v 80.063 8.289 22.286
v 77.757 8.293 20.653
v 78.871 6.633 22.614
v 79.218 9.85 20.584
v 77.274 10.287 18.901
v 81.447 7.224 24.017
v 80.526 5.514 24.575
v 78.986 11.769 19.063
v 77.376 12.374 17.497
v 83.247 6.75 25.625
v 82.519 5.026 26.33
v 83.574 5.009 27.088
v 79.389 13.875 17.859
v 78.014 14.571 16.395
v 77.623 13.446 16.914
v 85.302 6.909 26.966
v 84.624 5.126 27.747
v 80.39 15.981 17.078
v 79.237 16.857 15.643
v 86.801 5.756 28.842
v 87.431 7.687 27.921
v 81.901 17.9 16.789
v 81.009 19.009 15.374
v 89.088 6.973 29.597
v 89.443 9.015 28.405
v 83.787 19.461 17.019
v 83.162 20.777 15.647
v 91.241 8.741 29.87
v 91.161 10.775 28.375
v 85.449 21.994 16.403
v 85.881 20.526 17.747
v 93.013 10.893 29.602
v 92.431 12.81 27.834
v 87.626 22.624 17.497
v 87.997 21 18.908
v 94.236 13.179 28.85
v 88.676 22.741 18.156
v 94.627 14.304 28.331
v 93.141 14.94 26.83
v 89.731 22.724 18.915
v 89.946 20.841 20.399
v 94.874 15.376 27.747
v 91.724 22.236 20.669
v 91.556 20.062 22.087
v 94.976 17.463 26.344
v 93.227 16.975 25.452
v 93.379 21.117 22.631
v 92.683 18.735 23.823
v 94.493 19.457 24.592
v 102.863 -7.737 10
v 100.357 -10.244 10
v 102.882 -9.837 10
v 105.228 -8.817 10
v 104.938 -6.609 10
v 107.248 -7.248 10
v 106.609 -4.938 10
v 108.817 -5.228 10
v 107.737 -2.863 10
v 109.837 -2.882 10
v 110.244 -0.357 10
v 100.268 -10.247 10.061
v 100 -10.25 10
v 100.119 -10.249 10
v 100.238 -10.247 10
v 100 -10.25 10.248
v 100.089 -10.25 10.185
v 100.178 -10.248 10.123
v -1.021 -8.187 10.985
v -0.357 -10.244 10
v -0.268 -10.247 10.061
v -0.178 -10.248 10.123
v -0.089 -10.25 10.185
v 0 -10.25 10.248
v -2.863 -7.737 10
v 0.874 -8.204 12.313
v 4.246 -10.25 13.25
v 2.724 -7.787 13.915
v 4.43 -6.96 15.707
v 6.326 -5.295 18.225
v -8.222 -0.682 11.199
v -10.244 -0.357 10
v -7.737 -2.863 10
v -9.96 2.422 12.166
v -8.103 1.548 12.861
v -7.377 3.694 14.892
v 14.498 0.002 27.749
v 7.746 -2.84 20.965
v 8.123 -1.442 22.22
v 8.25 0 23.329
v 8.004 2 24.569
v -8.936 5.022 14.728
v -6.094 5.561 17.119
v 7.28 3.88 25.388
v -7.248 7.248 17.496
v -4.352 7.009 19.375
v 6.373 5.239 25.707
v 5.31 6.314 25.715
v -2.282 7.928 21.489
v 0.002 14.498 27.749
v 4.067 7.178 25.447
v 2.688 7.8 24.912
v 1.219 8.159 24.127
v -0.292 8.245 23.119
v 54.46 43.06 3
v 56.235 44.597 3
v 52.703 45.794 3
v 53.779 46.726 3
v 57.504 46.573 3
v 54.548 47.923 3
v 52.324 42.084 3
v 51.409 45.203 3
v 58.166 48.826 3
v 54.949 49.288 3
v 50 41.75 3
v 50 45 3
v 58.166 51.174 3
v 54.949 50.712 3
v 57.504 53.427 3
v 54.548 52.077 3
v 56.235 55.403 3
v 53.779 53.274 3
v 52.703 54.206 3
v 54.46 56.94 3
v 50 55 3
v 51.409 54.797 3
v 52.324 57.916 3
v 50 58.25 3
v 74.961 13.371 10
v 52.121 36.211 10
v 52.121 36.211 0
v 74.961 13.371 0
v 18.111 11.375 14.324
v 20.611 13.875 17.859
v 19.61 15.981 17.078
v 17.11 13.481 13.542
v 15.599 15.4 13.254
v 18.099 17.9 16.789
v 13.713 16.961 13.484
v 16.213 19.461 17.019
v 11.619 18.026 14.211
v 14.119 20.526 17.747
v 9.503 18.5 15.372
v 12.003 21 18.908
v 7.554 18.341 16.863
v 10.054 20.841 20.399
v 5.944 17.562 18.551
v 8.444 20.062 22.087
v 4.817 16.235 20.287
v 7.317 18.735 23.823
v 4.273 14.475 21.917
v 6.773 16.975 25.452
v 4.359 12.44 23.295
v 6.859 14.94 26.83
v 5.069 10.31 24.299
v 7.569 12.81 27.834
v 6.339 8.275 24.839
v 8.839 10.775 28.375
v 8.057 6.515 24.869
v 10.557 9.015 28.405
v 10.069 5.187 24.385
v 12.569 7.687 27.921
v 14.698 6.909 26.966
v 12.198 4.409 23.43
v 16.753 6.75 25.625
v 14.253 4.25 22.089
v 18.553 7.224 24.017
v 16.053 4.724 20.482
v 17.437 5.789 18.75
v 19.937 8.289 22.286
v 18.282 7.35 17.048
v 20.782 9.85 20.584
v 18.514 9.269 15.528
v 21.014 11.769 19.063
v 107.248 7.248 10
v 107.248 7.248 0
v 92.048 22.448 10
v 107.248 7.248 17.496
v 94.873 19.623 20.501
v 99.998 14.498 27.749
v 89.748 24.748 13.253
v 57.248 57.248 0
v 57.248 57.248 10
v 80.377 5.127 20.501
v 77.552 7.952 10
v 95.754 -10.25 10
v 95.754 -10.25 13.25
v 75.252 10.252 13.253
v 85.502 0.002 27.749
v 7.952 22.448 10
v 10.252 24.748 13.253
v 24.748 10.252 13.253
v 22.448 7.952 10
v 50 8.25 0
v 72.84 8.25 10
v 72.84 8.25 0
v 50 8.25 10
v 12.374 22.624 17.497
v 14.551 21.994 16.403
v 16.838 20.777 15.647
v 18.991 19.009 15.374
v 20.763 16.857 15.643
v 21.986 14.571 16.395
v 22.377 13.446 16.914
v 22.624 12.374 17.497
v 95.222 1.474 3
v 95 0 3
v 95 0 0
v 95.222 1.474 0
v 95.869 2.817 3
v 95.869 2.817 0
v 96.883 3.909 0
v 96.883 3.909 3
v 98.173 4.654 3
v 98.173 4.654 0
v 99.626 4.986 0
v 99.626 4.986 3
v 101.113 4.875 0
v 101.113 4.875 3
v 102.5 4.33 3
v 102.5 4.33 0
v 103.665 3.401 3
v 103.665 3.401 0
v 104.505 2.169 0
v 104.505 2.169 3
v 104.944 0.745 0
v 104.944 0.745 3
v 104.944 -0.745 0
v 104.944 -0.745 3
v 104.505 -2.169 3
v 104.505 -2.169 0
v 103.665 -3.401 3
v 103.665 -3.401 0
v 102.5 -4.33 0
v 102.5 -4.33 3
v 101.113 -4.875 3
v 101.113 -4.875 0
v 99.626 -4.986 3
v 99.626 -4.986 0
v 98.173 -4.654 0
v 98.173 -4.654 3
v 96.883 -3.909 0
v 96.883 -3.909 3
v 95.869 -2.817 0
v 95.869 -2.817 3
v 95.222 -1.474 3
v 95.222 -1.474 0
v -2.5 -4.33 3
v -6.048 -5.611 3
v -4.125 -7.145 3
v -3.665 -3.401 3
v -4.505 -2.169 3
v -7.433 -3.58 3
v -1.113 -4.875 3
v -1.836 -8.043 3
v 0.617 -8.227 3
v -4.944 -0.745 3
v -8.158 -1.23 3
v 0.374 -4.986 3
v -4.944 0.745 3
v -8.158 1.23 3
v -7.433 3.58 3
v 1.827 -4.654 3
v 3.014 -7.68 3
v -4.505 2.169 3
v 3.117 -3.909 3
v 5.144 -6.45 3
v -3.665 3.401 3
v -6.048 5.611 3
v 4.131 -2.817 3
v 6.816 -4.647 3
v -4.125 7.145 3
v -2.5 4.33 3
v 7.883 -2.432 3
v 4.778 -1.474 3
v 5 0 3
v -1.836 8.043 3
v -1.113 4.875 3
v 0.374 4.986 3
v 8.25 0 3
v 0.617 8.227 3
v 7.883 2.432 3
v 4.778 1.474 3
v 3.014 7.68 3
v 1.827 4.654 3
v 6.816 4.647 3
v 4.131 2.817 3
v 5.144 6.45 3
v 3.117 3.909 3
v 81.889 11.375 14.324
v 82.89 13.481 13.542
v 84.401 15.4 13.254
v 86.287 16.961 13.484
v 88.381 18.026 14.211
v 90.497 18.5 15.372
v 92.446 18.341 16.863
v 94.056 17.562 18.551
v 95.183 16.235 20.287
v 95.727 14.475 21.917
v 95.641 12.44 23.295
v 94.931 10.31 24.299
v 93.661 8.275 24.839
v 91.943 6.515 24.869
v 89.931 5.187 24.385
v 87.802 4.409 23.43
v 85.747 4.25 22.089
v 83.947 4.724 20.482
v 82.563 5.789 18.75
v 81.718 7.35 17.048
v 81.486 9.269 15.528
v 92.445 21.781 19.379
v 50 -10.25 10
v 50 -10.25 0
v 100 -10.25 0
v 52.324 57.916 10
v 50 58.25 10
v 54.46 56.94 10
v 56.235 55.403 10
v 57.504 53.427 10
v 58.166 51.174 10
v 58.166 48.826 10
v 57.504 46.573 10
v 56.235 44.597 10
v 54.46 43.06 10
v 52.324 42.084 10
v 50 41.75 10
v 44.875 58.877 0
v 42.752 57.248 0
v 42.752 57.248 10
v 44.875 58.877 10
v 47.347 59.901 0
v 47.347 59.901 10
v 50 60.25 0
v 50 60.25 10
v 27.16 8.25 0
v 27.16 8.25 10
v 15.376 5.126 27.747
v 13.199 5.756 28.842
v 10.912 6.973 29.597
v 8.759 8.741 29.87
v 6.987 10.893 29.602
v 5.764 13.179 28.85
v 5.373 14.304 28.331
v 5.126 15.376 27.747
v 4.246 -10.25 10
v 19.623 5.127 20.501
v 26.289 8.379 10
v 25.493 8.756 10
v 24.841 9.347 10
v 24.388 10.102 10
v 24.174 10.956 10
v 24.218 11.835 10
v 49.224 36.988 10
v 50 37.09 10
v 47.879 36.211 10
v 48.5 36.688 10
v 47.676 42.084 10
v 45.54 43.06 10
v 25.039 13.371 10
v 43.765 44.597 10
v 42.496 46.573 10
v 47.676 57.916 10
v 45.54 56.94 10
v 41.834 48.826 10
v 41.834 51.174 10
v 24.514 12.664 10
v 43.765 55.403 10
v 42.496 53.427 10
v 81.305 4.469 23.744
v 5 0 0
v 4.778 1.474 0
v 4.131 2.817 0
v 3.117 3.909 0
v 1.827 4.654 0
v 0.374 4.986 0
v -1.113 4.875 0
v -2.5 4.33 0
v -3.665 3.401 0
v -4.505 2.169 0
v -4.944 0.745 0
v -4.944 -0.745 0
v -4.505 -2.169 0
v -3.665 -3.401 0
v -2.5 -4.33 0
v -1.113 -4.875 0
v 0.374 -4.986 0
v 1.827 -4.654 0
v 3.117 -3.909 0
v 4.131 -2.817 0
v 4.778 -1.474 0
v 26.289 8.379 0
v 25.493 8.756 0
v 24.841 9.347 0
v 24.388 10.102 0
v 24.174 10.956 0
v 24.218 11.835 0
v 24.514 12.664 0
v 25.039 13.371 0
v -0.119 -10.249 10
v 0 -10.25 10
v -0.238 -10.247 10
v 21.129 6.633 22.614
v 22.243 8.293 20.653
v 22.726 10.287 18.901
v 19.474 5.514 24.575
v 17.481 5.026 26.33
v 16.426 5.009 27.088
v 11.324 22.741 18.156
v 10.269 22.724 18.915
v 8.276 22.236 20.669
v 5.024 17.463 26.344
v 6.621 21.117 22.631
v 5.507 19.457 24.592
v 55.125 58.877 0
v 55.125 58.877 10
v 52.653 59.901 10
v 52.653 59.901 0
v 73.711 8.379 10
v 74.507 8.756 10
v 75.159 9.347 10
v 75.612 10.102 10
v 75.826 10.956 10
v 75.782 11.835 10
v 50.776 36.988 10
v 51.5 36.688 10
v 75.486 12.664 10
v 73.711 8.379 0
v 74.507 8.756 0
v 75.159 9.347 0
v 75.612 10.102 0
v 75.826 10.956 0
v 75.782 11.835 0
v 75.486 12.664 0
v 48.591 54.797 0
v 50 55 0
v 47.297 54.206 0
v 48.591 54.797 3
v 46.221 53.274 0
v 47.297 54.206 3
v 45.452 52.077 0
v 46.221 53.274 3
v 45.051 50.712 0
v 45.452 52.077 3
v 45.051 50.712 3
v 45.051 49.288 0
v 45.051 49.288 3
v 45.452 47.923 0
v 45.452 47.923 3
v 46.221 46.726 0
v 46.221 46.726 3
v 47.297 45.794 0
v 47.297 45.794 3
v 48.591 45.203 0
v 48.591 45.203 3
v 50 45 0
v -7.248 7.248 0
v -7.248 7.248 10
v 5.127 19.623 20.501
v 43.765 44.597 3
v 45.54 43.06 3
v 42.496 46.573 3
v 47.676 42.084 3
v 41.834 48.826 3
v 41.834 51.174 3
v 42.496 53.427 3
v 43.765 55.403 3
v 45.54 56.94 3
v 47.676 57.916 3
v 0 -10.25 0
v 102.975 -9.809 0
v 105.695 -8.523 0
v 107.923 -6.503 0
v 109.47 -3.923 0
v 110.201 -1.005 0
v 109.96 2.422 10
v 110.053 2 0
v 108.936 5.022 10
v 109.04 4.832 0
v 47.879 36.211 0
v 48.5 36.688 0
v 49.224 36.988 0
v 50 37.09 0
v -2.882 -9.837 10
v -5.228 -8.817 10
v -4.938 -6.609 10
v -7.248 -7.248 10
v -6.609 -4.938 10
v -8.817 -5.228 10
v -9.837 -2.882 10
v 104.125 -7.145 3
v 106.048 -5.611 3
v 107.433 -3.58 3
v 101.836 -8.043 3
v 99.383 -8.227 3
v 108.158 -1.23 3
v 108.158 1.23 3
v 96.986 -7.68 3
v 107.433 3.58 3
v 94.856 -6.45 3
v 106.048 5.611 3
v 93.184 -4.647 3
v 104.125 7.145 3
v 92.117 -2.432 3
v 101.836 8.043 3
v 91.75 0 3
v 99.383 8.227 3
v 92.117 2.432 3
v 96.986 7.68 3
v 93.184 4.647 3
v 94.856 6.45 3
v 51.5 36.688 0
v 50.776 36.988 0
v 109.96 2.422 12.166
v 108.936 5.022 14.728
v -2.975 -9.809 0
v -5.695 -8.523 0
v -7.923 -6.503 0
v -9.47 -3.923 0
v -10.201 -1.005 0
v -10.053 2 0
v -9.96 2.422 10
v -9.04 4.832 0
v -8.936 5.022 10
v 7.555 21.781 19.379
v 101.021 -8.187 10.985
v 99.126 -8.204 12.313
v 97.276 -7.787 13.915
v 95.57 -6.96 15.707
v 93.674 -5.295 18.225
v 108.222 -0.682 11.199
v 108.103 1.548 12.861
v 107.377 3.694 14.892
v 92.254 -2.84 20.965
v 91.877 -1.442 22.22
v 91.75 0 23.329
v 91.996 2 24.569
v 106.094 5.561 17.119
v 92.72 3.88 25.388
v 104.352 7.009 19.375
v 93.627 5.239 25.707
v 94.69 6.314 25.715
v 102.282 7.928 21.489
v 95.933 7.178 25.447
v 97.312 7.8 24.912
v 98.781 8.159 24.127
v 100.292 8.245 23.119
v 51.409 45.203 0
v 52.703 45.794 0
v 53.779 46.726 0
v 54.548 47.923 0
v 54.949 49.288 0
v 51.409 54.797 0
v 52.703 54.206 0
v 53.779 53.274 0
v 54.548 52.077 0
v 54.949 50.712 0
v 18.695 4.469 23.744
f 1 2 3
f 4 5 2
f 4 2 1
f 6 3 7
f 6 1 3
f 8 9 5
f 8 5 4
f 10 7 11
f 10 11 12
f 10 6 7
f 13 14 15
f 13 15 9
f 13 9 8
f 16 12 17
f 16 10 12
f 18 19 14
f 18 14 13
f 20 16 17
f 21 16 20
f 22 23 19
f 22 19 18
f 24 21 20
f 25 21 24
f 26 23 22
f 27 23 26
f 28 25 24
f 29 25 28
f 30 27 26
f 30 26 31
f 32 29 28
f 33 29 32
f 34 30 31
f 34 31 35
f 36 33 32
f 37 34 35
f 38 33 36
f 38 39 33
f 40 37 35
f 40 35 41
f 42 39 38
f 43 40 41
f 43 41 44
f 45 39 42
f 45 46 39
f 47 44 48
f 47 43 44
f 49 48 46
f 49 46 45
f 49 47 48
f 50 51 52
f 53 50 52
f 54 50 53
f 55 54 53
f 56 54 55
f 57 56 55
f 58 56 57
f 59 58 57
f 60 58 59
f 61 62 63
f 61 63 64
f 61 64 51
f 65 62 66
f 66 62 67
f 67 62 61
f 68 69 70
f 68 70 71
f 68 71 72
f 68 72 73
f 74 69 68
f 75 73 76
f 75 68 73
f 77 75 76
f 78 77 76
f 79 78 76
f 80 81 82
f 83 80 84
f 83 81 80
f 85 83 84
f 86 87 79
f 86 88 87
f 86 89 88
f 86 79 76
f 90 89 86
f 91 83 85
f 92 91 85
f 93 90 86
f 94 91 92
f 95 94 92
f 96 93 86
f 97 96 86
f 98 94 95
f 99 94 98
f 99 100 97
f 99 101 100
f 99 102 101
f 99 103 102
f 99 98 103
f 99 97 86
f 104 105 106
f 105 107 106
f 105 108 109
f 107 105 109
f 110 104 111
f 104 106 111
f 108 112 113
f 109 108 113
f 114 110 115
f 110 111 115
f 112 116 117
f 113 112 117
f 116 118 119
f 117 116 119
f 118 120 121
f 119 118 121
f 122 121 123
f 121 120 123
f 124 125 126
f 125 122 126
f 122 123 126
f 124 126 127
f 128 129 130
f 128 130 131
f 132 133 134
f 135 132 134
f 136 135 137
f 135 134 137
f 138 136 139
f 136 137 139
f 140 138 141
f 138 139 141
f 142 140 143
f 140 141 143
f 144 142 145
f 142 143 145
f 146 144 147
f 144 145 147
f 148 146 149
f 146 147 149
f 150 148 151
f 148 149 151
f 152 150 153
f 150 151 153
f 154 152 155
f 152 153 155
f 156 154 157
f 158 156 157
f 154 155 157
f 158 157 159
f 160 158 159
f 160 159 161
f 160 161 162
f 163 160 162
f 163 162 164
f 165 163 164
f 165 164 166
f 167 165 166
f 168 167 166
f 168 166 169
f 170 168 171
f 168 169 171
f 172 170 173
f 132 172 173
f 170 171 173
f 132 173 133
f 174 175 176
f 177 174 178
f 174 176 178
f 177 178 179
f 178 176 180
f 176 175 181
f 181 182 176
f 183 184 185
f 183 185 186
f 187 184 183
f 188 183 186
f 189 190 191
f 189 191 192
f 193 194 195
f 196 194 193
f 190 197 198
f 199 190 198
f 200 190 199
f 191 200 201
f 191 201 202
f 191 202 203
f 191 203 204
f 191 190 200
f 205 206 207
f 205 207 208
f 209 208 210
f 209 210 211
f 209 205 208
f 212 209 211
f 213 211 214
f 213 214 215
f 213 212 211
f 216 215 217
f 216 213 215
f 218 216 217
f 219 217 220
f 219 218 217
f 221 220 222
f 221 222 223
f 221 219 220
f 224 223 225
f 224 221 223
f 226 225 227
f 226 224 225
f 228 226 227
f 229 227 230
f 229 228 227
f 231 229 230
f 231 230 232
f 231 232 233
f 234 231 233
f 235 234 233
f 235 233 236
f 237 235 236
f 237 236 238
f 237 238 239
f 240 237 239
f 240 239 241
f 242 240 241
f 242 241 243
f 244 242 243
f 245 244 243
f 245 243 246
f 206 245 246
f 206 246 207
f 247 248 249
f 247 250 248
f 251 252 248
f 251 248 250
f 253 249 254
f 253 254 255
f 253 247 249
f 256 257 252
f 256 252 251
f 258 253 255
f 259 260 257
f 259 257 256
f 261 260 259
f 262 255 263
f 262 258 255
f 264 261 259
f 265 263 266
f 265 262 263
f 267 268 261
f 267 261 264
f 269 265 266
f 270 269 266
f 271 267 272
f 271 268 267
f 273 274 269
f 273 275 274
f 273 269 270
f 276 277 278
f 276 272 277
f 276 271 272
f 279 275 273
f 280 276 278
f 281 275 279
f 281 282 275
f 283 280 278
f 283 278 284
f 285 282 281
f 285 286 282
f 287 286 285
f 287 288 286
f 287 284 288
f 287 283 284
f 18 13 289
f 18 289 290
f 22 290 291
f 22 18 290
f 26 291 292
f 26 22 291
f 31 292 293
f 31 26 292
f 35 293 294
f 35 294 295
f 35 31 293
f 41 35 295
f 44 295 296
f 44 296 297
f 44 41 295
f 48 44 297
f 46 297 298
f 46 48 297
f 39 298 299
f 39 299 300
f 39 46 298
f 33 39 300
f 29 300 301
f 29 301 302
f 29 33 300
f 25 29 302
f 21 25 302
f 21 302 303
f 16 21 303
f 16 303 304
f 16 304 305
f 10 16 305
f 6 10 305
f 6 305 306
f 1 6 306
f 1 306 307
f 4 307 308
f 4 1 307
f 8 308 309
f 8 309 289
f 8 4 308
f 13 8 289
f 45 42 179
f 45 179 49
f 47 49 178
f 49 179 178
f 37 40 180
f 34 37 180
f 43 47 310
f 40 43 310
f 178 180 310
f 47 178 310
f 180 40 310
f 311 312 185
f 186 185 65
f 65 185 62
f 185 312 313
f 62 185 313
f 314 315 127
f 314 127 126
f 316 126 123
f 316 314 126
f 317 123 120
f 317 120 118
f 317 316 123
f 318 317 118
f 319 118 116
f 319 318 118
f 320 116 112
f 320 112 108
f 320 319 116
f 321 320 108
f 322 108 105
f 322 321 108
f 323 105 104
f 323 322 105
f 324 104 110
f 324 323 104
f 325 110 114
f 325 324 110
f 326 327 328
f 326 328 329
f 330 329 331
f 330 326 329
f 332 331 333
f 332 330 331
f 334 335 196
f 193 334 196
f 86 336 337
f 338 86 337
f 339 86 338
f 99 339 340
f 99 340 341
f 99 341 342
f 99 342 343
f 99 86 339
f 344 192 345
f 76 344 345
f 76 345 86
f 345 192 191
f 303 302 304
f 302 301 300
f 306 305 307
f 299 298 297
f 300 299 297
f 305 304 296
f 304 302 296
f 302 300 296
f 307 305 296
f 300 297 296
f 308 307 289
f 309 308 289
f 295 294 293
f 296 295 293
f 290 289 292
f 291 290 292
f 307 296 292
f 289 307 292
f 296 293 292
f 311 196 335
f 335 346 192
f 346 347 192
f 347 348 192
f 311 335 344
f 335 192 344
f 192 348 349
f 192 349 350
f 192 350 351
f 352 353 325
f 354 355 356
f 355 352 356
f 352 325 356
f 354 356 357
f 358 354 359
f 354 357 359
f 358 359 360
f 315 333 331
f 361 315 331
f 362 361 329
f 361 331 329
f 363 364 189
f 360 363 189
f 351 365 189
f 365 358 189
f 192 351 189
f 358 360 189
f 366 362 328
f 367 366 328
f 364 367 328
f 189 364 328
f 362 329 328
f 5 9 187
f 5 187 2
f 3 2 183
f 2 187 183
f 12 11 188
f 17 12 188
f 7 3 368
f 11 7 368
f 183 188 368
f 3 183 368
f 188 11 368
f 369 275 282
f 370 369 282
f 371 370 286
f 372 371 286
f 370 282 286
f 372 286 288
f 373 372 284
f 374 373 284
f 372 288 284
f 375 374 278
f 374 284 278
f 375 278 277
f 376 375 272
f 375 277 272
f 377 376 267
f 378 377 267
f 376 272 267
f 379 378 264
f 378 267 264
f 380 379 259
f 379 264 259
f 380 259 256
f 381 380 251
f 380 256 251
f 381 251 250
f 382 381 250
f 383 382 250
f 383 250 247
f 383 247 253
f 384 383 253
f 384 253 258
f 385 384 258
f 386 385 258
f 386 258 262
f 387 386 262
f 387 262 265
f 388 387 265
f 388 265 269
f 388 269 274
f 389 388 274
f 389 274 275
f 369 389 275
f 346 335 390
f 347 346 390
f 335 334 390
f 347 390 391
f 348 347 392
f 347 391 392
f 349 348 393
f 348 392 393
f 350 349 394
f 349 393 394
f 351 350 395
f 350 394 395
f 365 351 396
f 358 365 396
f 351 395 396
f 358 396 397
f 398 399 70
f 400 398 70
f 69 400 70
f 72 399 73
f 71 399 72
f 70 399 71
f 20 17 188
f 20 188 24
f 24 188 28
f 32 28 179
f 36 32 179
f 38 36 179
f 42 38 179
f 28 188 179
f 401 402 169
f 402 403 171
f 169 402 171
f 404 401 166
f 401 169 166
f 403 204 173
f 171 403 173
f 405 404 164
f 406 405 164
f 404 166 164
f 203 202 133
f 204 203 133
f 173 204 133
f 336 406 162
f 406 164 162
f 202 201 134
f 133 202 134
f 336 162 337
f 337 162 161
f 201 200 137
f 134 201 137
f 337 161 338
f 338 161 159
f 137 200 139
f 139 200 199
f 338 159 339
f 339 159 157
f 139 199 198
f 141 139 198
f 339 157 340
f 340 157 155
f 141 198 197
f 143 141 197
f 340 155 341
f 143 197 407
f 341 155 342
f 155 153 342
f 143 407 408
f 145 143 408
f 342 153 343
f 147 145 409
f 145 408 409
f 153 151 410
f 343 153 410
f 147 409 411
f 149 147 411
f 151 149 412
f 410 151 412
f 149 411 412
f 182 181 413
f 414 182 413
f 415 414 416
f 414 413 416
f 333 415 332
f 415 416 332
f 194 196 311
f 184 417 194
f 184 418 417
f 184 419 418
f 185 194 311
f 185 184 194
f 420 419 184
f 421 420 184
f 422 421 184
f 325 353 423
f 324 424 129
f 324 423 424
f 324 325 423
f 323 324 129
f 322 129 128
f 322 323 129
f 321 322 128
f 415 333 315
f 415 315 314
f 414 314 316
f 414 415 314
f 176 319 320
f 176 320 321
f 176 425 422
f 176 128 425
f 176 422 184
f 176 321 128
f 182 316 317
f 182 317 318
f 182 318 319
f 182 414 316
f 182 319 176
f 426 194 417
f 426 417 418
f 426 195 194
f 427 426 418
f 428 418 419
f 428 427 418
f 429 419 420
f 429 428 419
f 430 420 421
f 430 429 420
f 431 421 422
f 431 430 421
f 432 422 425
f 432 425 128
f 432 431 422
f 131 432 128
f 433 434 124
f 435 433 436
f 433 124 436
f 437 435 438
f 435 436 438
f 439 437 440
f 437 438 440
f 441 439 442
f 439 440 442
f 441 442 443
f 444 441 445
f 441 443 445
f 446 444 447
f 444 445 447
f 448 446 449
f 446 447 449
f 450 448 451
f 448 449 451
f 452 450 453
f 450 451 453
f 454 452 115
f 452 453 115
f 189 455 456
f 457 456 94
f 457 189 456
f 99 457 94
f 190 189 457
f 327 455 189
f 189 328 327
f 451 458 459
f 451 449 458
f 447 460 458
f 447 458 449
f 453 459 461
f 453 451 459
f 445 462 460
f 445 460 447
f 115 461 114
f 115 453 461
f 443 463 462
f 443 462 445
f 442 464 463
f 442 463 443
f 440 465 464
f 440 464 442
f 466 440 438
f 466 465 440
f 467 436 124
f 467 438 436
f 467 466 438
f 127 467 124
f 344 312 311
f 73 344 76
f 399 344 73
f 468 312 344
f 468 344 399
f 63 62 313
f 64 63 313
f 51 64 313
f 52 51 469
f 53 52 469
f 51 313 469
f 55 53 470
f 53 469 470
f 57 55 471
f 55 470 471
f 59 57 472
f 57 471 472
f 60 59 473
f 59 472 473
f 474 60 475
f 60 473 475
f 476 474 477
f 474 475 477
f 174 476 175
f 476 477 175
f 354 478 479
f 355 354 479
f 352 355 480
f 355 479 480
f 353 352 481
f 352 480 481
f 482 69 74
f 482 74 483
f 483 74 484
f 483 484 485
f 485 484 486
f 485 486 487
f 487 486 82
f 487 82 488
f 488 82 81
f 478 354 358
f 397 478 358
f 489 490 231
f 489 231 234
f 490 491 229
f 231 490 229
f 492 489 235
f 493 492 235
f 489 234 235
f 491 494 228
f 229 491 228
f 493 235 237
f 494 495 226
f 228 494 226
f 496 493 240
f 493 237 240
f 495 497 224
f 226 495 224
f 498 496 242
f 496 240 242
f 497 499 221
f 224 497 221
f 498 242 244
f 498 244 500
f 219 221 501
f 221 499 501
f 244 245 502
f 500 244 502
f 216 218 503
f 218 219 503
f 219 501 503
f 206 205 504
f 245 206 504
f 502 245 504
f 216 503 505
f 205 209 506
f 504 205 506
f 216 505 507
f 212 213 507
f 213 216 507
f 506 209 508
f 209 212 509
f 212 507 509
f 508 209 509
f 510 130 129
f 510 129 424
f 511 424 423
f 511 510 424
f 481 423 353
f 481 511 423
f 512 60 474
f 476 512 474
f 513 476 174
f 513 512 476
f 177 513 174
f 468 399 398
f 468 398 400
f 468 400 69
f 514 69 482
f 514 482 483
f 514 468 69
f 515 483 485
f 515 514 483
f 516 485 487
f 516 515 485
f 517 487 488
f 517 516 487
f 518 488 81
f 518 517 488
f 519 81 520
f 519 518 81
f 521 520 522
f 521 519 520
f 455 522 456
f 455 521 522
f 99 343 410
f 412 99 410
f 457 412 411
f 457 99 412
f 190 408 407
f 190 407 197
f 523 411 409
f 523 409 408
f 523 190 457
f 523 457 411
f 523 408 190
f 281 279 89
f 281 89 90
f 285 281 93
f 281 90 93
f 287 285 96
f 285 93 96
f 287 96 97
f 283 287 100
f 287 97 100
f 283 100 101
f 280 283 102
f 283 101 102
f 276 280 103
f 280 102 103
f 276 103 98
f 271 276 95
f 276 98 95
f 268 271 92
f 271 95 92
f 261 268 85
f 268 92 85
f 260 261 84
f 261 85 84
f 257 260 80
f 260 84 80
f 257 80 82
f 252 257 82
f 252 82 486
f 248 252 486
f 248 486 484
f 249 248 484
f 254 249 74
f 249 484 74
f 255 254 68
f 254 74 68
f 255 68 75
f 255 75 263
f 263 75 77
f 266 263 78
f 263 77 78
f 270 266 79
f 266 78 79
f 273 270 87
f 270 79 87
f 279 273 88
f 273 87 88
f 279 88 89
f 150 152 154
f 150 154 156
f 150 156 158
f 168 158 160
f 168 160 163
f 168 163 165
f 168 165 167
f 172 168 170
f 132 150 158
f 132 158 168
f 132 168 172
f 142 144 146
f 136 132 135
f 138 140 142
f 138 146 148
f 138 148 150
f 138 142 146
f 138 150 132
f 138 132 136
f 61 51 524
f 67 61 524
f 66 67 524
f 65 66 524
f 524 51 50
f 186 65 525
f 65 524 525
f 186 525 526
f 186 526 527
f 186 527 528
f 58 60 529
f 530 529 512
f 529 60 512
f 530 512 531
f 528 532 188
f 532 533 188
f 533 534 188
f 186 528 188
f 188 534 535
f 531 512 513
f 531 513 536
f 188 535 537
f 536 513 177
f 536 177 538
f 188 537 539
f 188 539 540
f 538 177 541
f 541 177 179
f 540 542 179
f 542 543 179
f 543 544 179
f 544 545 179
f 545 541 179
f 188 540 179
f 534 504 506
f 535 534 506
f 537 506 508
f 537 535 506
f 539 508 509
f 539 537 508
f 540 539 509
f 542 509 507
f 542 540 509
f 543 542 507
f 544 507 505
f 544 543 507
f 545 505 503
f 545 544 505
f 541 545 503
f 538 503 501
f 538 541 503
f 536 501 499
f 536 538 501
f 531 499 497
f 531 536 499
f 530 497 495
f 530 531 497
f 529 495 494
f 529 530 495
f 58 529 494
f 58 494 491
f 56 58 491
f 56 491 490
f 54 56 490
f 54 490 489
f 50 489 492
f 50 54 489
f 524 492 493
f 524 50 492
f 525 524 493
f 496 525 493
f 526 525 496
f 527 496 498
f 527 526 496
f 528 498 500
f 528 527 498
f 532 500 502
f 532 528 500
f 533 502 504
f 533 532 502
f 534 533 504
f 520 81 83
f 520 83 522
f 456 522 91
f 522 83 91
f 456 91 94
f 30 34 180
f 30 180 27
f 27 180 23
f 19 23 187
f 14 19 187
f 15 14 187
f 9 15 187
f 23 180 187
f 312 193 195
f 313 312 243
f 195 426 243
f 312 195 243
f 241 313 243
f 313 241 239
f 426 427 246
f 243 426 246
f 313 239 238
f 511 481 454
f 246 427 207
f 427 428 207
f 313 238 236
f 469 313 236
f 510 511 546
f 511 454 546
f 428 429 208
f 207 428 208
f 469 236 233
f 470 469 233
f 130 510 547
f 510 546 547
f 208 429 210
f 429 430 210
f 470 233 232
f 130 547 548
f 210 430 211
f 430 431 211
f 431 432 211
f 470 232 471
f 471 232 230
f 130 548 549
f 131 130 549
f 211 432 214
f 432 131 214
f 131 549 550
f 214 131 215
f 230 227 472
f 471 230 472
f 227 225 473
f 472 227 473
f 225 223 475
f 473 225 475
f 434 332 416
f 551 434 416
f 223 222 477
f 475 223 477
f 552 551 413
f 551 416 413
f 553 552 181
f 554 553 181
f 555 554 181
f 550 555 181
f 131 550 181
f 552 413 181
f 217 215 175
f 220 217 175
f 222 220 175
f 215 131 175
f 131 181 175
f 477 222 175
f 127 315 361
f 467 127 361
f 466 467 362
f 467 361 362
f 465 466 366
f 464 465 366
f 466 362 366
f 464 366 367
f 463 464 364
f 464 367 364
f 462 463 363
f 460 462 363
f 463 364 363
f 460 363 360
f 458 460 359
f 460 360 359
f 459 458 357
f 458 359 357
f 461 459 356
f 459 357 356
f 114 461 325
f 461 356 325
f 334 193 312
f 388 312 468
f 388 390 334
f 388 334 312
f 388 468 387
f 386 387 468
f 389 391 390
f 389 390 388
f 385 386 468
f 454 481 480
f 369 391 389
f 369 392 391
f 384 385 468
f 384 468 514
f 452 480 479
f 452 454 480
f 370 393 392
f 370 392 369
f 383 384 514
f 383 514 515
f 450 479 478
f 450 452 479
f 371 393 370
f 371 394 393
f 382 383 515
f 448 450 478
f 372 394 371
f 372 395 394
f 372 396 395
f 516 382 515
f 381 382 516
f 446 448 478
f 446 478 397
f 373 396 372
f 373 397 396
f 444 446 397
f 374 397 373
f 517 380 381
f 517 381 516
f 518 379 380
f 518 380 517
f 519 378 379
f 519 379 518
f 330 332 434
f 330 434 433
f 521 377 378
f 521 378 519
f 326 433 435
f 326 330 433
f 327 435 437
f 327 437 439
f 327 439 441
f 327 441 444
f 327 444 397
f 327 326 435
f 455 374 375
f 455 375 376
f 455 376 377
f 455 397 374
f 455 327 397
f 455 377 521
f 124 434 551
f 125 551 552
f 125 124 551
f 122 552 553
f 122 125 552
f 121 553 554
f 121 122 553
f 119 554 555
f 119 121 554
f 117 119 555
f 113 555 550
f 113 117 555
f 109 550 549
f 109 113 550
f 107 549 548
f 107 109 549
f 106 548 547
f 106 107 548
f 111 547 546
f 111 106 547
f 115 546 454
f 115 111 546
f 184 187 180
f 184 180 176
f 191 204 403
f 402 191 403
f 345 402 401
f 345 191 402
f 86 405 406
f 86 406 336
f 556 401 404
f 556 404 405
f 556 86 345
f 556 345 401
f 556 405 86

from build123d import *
from build123d.topology import SkipClean

# Parameters (mm, degrees)
BOSS_EXTRUDE1_DEPTH = 10
SKETCH2_R           = 8.25
CUT_EXTRUDE1_DEPTH  = 7
CUT_EXTRUDE2_DEPTH  = 16
FILLET2_R           = 3
SKETCH5_R           = 5
CUT_EXTRUDE3_DEPTH  = 16
BOSS_EXTRUDE2_DEPTH = 20.5
CUT_EXTRUDE4_START  = 20
SKETCH7_R           = 8.25
SKETCH7_R_2         = 5
CUT_EXTRUDE4_DEPTH  = 20
SKETCH9_R           = 8.25
CUT_EXTRUDE5_DEPTH  = 5
SKETCH10_W          = 60.25
SKETCH10_H          = 70.5
CUT_EXTRUDE6_DEPTH  = 45


with BuildPart() as part:
    # Sketch1 → Boss-Extrude1 (new body)
    with BuildSketch(Plane.XY):
        with BuildLine():
            Line((0, 10.25), (100, 10.25))
            ThreePointArc((100, 10.25), (110.25, 0), (100, -10.25))
            Line((100, -10.25), (0, -10.25))
            ThreePointArc((0, -10.25), (-10.25, 0), (0, 10.25))
        make_face()
        with BuildLine():
            Line((92.752155493, -7.247844507), (42.752155493, 42.752155493))
            ThreePointArc((42.752155493, 42.752155493), (42.752155493, 57.247844507), (57.247844507, 57.247844507))
            Line((57.247844507, 57.247844507), (107.247844507, 7.247844507))
            ThreePointArc((107.247844507, 7.247844507), (107.247844507, -7.247844507), (92.752155493, -7.247844507))
        make_face()
        with BuildLine():
            Line((57.247844507, 42.752155493), (7.247844507, -7.247844507))
            ThreePointArc((7.247844507, -7.247844507), (-7.247844507, -7.247844507), (-7.247844507, 7.247844507))
            Line((-7.247844507, 7.247844507), (42.752155493, 57.247844507))
            ThreePointArc((42.752155493, 57.247844507), (57.247844507, 57.247844507), (57.247844507, 42.752155493))
        make_face()
    extrude(amount=BOSS_EXTRUDE1_DEPTH)

    # Sketch2 → Cut-Extrude1 (cut)
    with BuildSketch(Plane.XY.offset(10)):
        with Locations((50, 50)):
            Circle(SKETCH2_R)
        with Locations((100, 0)):
            Circle(SKETCH2_R)
        Circle(SKETCH2_R)
    extrude(amount=-CUT_EXTRUDE1_DEPTH, mode=Mode.SUBTRACT)

    # Sketch4 → Cut-Extrude2 (cut)
    with BuildSketch(Plane.XY.offset(10)):
        Polygon((19.91726189, 8.25), (80.08273811, 8.25), (50, 38.33273811), align=None)
    extrude(amount=-CUT_EXTRUDE2_DEPTH, mode=Mode.SUBTRACT)

    # Fillet2
    fillet2_edges = [part.edges().sort_by_distance(p)[0] for p in [
        (19.91726189, 8.25, 5),
        (50, 38.33273811, 5),
        (80.08273811, 8.25, 5),
    ]]
    fillet(fillet2_edges, radius=FILLET2_R)

    # Sketch5 → Cut-Extrude3 (cut)
    with BuildSketch(Plane.XY.offset(10)):
        Circle(SKETCH5_R)
        with Locations((50, 50)):
            Circle(SKETCH5_R)
        with Locations((100, 0)):
            Circle(SKETCH5_R)
    extrude(amount=-CUT_EXTRUDE3_DEPTH, mode=Mode.SUBTRACT)

    # Sketch6 → Boss-Extrude2 (add)
    with BuildSketch(Plane(origin=(-7.247844507, 7.247844507, 0), x_dir=(0, 0, 1), z_dir=(-0.7071067811865441, 0.7071067811865509, 0))):
        Polygon((10, 21.495689014), (10, 7), (20.500892834, 17.500892834), (13.253048327, 24.748737342), align=None)
        Polygon((20.500892834, 17.500892834), (10, 7), (10, 0), (10, -7.495689014), (27.748737342, 10.253048327), align=None)
    extrude(amount=-BOSS_EXTRUDE2_DEPTH)

    # Sketch7 → Cut-Extrude4 (cut)
    # profile 1 of 3: a face of its own
    with BuildSketch(Plane.XY.offset(10).offset(CUT_EXTRUDE4_START)):
        with BuildLine():
            Line((20, -20.25), (20, -10.25))
            Line((20, -10.25), (4.245689014, -10.25))
            Line((4.245689014, -10.25), (0, -10.25))
            ThreePointArc((0, -10.25), (-9.469765208, -3.922505182), (-7.247844507, 7.247844507))
            Line((-7.247844507, 7.247844507), (7.951902961, 22.447591975))
            Line((7.951902961, 22.447591975), (15.254310986, 29.75))
            Line((15.254310986, 29.75), (-20, 29.75))
            Line((-20, 29.75), (-20, -20.25))
            Line((-20, -20.25), (20, -20.25))
        make_face()
    # profile 2 of 3: a face of its own
    with BuildSketch(Plane.XY.offset(10).offset(CUT_EXTRUDE4_START)):
        Circle(SKETCH7_R)
        Circle(SKETCH7_R_2, mode=Mode.SUBTRACT)
    # profile 3 of 3: a face of its own
    with BuildSketch(Plane.XY.offset(10).offset(CUT_EXTRUDE4_START)):
        Circle(SKETCH7_R_2)
    extrude(amount=-CUT_EXTRUDE4_DEPTH, mode=Mode.SUBTRACT)

    # Loft1: read off the stored shape, not the designer's step
    # Loft1: loft between two sections, ruled curve by curve
    loft1_from = [
        Edge.make_bspline([(12.373922254, 22.623922254, 17.497213178), (12.889457441, 22.535470399, 17.195219657), (13.432134989, 22.397880865, 16.908779176), (14.549790596, 22.011562197, 16.391645867), (15.124688663, 21.762676267, 16.161120474), (16.274806274, 21.151537295, 15.780005023), (16.849824782, 20.789221108, 15.629601769), (17.962375724, 19.963587433, 15.426720624), (18.499640751, 19.500359249, 15.374368671), (19.500359249, 18.499640751, 15.374368671), (19.963587433, 17.962375724, 15.426720624), (20.789221108, 16.849824782, 15.629601769), (21.151537295, 16.274806274, 15.780005023), (21.762676267, 15.124688663, 16.161120474), (22.011562197, 14.549790596, 16.391645867), (22.397880865, 13.432134989, 16.908779176), (22.535470399, 12.889457441, 17.195219657), (22.623922254, 12.373922254, 17.497213178)], [0, 0, 0, 0, 0.125, 0.125, 0.25, 0.25, 0.375, 0.375, 0.5, 0.5, 0.625, 0.625, 0.75, 0.75, 0.875, 0.875, 1, 1, 1, 1], 3),
        Edge.make_bspline([(22.623922254, 12.373922254, 17.497213178), (22.712374108, 11.858387066, 17.799206699), (22.758303856, 11.331435851, 18.13934024), (22.743701961, 10.282567338, 18.891327377), (22.682975729, 9.76079032, 19.303219376), (22.441392942, 8.756976633, 20.183847667), (22.260398337, 8.27517552, 20.652515015), (21.778027739, 7.387042631, 21.621607323), (21.476651925, 6.980962911, 22.121853929), (20.769037089, 6.273348075, 23.122572427), (20.362957369, 5.971972261, 23.622819032), (19.47482448, 5.489601663, 24.591911341), (18.993023367, 5.308607058, 25.060578689), (17.98920968, 5.067024271, 25.94120698), (17.467432662, 5.006298039, 26.353098979), (16.418564149, 4.991696144, 27.105086116), (15.891612934, 5.037625892, 27.445219657), (15.376077746, 5.126077746, 27.747213178)], [0, 0, 0, 0, 0.125, 0.125, 0.25, 0.25, 0.375, 0.375, 0.5, 0.5, 0.625, 0.625, 0.75, 0.75, 0.875, 0.875, 1, 1, 1, 1], 3),
        Edge.make_bspline([(5.126077746, 15.376077746, 27.747213178), (5.037625892, 15.891612934, 27.445219657), (4.991696144, 16.418564149, 27.105086116), (5.006298039, 17.467432662, 26.353098979), (5.067024271, 17.98920968, 25.94120698), (5.308607058, 18.993023367, 25.060578689), (5.489601663, 19.47482448, 24.591911341), (5.971972261, 20.362957369, 23.622819032), (6.273348075, 20.769037089, 23.122572427), (6.980962911, 21.476651925, 22.121853929), (7.387042631, 21.778027739, 21.621607323), (8.27517552, 22.260398337, 20.652515015), (8.756976633, 22.441392942, 20.183847667), (9.76079032, 22.682975729, 19.303219376), (10.282567338, 22.743701961, 18.891327377), (11.331435851, 22.758303856, 18.13934024), (11.858387066, 22.712374108, 17.799206699), (12.373922254, 22.623922254, 17.497213178)], [0, 0, 0, 0, 0.125, 0.125, 0.25, 0.25, 0.375, 0.375, 0.5, 0.5, 0.625, 0.625, 0.75, 0.75, 0.875, 0.875, 1, 1, 1, 1], 3),
        Edge.make_bspline([(15.376077746, 5.126077746, 27.747213178), (14.860542559, 5.214529601, 28.049206699), (14.317865011, 5.352119135, 28.33564718), (13.200209404, 5.738437803, 28.852780489), (12.625311337, 5.987323733, 29.083305882), (11.475193726, 6.598462705, 29.464421332), (10.900175218, 6.960778892, 29.614824586), (9.787624276, 7.786412567, 29.817705732), (9.250359249, 8.249640751, 29.870057685), (8.249640751, 9.250359249, 29.870057685), (7.786412567, 9.787624276, 29.817705732), (6.960778892, 10.900175218, 29.614824586), (6.598462705, 11.475193726, 29.464421332), (5.987323733, 12.625311337, 29.083305882), (5.738437803, 13.200209404, 28.852780489), (5.352119135, 14.317865011, 28.33564718), (5.214529601, 14.860542559, 28.049206699), (5.126077746, 15.376077746, 27.747213178)], [0, 0, 0, 0, 0.125, 0.125, 0.25, 0.25, 0.375, 0.375, 0.5, 0.5, 0.625, 0.625, 0.75, 0.75, 0.875, 0.875, 1, 1, 1, 1], 3),
    ]
    loft1_to = [
        Edge.make_bspline([(10.252155493, 24.747844507, 13.253048327), (10.856142535, 24.143857465, 13.253048327), (11.460129577, 23.539870423, 13.253048327), (12.668103662, 22.331896338, 13.253048327), (13.272090704, 21.727909296, 13.253048327), (14.480064789, 20.519935211, 13.253048327), (15.084051831, 19.915948169, 13.253048327), (16.292025915, 18.707974085, 13.253048327), (16.896012958, 18.103987042, 13.253048327), (18.103987042, 16.896012958, 13.253048327), (18.707974085, 16.292025915, 13.253048327), (19.915948169, 15.084051831, 13.253048327), (20.519935211, 14.480064789, 13.253048327), (21.727909296, 13.272090704, 13.253048327), (22.331896338, 12.668103662, 13.253048327), (23.539870423, 11.460129577, 13.253048327), (24.143857465, 10.856142535, 13.253048327), (24.747844507, 10.252155493, 13.253048327)], [0, 0, 0, 0, 0.125, 0.125, 0.25, 0.25, 0.375, 0.375, 0.5, 0.5, 0.625, 0.625, 0.75, 0.75, 0.875, 0.875, 1, 1, 1, 1], 3),
        Edge.make_bspline([(24.747844507, 10.252155493, 13.253048327), (24.320761174, 9.82507216, 13.857035369), (23.89367784, 9.397988826, 14.461022412), (23.039511174, 8.54382216, 15.668996496), (22.61242784, 8.116738826, 16.272983539), (21.758261174, 7.26257216, 17.480957623), (21.33117784, 6.835488826, 18.084944665), (20.477011174, 5.98132216, 19.29291875), (20.04992784, 5.554238826, 19.896905792), (19.195761174, 4.70007216, 21.104879877), (18.76867784, 4.272988826, 21.708866919), (17.914511174, 3.41882216, 22.916841003), (17.48742784, 2.991738826, 23.520828046), (16.633261174, 2.13757216, 24.72880213), (16.20617784, 1.710488826, 25.332789172), (15.352011174, 0.85632216, 26.540763257), (14.92492784, 0.429238826, 27.144750299), (14.497844507, 0.002155493, 27.748737342)], [0, 0, 0, 0, 0.125, 0.125, 0.25, 0.25, 0.375, 0.375, 0.5, 0.5, 0.625, 0.625, 0.75, 0.75, 0.875, 0.875, 1, 1, 1, 1], 3),
        Edge.make_bspline([(0.002155493, 14.497844507, 27.748737342), (0.429238826, 14.92492784, 27.144750299), (0.85632216, 15.352011174, 26.540763257), (1.710488826, 16.20617784, 25.332789172), (2.13757216, 16.633261174, 24.72880213), (2.991738826, 17.48742784, 23.520828046), (3.41882216, 17.914511174, 22.916841003), (4.272988826, 18.76867784, 21.708866919), (4.70007216, 19.195761174, 21.104879877), (5.554238826, 20.04992784, 19.896905792), (5.98132216, 20.477011174, 19.29291875), (6.835488826, 21.33117784, 18.084944665), (7.26257216, 21.758261174, 17.480957623), (8.116738826, 22.61242784, 16.272983539), (8.54382216, 23.039511174, 15.668996496), (9.397988826, 23.89367784, 14.461022412), (9.82507216, 24.320761174, 13.857035369), (10.252155493, 24.747844507, 13.253048327)], [0, 0, 0, 0, 0.125, 0.125, 0.25, 0.25, 0.375, 0.375, 0.5, 0.5, 0.625, 0.625, 0.75, 0.75, 0.875, 0.875, 1, 1, 1, 1], 3),
        Edge.make_bspline([(14.497844507, 0.002155493, 27.748737342), (13.893857465, 0.606142535, 27.748737342), (13.289870423, 1.210129577, 27.748737342), (12.081896338, 2.418103662, 27.748737342), (11.477909296, 3.022090704, 27.748737342), (10.269935211, 4.230064789, 27.748737342), (9.665948169, 4.834051831, 27.748737342), (8.457974085, 6.042025915, 27.748737342), (7.853987042, 6.646012958, 27.748737342), (6.646012958, 7.853987042, 27.748737342), (6.042025915, 8.457974085, 27.748737342), (4.834051831, 9.665948169, 27.748737342), (4.230064789, 10.269935211, 27.748737342), (3.022090704, 11.477909296, 27.748737342), (2.418103662, 12.081896338, 27.748737342), (1.210129577, 13.289870423, 27.748737342), (0.606142535, 13.893857465, 27.748737342), (0.002155493, 14.497844507, 27.748737342)], [0, 0, 0, 0, 0.125, 0.125, 0.25, 0.25, 0.375, 0.375, 0.5, 0.5, 0.625, 0.625, 0.75, 0.75, 0.875, 0.875, 1, 1, 1, 1], 3),
    ]
    loft1 = Solid(Shell([*[Face.make_surface_from_curves(loft1_from[k], loft1_to[k]) for k in range(4)], Face(Wire(loft1_from)), Face(Wire(loft1_to))]))
    add(loft1)

    # Sketch9 → Cut-Extrude5 (cut)
    with BuildSketch(Plane(origin=(14.935660172, 14.935660172, 21.122213178), x_dir=(0.8660254037844357, -0.2886751345948172, -0.40824829046386635), z_dir=(0.5000000000000052, 0.5000000000000007, 0.7071067811865435))):
        with Locations(Location((-1.224744871, -1.732050808, 0), (0, 0, 19.471220634))):
            Circle(SKETCH9_R)
    extrude(amount=-CUT_EXTRUDE5_DEPTH, mode=Mode.SUBTRACT)

    # Sketch10 → Cut-Extrude6 (cut)
    with BuildSketch(Plane(origin=(0, 0, 0), x_dir=(-1, 0, 0), z_dir=(0, 0, -1))):
        with Locations((-80.125, 25)):
            Rectangle(SKETCH10_W, SKETCH10_H)
    extrude(amount=-CUT_EXTRUDE6_DEPTH, mode=Mode.SUBTRACT)

    # Mirror1: part across plane


with BuildPart() as part_1:
    with SkipClean():  # the faces are left unmerged after this step: merging them gives an invalid solid
        add(part.part)
        add(part.part.mirror(Plane(origin=(50, 60.25, 45), x_dir=(0, 0, 1), z_dir=(-1, 0, 0))))


solid = part_1.part
